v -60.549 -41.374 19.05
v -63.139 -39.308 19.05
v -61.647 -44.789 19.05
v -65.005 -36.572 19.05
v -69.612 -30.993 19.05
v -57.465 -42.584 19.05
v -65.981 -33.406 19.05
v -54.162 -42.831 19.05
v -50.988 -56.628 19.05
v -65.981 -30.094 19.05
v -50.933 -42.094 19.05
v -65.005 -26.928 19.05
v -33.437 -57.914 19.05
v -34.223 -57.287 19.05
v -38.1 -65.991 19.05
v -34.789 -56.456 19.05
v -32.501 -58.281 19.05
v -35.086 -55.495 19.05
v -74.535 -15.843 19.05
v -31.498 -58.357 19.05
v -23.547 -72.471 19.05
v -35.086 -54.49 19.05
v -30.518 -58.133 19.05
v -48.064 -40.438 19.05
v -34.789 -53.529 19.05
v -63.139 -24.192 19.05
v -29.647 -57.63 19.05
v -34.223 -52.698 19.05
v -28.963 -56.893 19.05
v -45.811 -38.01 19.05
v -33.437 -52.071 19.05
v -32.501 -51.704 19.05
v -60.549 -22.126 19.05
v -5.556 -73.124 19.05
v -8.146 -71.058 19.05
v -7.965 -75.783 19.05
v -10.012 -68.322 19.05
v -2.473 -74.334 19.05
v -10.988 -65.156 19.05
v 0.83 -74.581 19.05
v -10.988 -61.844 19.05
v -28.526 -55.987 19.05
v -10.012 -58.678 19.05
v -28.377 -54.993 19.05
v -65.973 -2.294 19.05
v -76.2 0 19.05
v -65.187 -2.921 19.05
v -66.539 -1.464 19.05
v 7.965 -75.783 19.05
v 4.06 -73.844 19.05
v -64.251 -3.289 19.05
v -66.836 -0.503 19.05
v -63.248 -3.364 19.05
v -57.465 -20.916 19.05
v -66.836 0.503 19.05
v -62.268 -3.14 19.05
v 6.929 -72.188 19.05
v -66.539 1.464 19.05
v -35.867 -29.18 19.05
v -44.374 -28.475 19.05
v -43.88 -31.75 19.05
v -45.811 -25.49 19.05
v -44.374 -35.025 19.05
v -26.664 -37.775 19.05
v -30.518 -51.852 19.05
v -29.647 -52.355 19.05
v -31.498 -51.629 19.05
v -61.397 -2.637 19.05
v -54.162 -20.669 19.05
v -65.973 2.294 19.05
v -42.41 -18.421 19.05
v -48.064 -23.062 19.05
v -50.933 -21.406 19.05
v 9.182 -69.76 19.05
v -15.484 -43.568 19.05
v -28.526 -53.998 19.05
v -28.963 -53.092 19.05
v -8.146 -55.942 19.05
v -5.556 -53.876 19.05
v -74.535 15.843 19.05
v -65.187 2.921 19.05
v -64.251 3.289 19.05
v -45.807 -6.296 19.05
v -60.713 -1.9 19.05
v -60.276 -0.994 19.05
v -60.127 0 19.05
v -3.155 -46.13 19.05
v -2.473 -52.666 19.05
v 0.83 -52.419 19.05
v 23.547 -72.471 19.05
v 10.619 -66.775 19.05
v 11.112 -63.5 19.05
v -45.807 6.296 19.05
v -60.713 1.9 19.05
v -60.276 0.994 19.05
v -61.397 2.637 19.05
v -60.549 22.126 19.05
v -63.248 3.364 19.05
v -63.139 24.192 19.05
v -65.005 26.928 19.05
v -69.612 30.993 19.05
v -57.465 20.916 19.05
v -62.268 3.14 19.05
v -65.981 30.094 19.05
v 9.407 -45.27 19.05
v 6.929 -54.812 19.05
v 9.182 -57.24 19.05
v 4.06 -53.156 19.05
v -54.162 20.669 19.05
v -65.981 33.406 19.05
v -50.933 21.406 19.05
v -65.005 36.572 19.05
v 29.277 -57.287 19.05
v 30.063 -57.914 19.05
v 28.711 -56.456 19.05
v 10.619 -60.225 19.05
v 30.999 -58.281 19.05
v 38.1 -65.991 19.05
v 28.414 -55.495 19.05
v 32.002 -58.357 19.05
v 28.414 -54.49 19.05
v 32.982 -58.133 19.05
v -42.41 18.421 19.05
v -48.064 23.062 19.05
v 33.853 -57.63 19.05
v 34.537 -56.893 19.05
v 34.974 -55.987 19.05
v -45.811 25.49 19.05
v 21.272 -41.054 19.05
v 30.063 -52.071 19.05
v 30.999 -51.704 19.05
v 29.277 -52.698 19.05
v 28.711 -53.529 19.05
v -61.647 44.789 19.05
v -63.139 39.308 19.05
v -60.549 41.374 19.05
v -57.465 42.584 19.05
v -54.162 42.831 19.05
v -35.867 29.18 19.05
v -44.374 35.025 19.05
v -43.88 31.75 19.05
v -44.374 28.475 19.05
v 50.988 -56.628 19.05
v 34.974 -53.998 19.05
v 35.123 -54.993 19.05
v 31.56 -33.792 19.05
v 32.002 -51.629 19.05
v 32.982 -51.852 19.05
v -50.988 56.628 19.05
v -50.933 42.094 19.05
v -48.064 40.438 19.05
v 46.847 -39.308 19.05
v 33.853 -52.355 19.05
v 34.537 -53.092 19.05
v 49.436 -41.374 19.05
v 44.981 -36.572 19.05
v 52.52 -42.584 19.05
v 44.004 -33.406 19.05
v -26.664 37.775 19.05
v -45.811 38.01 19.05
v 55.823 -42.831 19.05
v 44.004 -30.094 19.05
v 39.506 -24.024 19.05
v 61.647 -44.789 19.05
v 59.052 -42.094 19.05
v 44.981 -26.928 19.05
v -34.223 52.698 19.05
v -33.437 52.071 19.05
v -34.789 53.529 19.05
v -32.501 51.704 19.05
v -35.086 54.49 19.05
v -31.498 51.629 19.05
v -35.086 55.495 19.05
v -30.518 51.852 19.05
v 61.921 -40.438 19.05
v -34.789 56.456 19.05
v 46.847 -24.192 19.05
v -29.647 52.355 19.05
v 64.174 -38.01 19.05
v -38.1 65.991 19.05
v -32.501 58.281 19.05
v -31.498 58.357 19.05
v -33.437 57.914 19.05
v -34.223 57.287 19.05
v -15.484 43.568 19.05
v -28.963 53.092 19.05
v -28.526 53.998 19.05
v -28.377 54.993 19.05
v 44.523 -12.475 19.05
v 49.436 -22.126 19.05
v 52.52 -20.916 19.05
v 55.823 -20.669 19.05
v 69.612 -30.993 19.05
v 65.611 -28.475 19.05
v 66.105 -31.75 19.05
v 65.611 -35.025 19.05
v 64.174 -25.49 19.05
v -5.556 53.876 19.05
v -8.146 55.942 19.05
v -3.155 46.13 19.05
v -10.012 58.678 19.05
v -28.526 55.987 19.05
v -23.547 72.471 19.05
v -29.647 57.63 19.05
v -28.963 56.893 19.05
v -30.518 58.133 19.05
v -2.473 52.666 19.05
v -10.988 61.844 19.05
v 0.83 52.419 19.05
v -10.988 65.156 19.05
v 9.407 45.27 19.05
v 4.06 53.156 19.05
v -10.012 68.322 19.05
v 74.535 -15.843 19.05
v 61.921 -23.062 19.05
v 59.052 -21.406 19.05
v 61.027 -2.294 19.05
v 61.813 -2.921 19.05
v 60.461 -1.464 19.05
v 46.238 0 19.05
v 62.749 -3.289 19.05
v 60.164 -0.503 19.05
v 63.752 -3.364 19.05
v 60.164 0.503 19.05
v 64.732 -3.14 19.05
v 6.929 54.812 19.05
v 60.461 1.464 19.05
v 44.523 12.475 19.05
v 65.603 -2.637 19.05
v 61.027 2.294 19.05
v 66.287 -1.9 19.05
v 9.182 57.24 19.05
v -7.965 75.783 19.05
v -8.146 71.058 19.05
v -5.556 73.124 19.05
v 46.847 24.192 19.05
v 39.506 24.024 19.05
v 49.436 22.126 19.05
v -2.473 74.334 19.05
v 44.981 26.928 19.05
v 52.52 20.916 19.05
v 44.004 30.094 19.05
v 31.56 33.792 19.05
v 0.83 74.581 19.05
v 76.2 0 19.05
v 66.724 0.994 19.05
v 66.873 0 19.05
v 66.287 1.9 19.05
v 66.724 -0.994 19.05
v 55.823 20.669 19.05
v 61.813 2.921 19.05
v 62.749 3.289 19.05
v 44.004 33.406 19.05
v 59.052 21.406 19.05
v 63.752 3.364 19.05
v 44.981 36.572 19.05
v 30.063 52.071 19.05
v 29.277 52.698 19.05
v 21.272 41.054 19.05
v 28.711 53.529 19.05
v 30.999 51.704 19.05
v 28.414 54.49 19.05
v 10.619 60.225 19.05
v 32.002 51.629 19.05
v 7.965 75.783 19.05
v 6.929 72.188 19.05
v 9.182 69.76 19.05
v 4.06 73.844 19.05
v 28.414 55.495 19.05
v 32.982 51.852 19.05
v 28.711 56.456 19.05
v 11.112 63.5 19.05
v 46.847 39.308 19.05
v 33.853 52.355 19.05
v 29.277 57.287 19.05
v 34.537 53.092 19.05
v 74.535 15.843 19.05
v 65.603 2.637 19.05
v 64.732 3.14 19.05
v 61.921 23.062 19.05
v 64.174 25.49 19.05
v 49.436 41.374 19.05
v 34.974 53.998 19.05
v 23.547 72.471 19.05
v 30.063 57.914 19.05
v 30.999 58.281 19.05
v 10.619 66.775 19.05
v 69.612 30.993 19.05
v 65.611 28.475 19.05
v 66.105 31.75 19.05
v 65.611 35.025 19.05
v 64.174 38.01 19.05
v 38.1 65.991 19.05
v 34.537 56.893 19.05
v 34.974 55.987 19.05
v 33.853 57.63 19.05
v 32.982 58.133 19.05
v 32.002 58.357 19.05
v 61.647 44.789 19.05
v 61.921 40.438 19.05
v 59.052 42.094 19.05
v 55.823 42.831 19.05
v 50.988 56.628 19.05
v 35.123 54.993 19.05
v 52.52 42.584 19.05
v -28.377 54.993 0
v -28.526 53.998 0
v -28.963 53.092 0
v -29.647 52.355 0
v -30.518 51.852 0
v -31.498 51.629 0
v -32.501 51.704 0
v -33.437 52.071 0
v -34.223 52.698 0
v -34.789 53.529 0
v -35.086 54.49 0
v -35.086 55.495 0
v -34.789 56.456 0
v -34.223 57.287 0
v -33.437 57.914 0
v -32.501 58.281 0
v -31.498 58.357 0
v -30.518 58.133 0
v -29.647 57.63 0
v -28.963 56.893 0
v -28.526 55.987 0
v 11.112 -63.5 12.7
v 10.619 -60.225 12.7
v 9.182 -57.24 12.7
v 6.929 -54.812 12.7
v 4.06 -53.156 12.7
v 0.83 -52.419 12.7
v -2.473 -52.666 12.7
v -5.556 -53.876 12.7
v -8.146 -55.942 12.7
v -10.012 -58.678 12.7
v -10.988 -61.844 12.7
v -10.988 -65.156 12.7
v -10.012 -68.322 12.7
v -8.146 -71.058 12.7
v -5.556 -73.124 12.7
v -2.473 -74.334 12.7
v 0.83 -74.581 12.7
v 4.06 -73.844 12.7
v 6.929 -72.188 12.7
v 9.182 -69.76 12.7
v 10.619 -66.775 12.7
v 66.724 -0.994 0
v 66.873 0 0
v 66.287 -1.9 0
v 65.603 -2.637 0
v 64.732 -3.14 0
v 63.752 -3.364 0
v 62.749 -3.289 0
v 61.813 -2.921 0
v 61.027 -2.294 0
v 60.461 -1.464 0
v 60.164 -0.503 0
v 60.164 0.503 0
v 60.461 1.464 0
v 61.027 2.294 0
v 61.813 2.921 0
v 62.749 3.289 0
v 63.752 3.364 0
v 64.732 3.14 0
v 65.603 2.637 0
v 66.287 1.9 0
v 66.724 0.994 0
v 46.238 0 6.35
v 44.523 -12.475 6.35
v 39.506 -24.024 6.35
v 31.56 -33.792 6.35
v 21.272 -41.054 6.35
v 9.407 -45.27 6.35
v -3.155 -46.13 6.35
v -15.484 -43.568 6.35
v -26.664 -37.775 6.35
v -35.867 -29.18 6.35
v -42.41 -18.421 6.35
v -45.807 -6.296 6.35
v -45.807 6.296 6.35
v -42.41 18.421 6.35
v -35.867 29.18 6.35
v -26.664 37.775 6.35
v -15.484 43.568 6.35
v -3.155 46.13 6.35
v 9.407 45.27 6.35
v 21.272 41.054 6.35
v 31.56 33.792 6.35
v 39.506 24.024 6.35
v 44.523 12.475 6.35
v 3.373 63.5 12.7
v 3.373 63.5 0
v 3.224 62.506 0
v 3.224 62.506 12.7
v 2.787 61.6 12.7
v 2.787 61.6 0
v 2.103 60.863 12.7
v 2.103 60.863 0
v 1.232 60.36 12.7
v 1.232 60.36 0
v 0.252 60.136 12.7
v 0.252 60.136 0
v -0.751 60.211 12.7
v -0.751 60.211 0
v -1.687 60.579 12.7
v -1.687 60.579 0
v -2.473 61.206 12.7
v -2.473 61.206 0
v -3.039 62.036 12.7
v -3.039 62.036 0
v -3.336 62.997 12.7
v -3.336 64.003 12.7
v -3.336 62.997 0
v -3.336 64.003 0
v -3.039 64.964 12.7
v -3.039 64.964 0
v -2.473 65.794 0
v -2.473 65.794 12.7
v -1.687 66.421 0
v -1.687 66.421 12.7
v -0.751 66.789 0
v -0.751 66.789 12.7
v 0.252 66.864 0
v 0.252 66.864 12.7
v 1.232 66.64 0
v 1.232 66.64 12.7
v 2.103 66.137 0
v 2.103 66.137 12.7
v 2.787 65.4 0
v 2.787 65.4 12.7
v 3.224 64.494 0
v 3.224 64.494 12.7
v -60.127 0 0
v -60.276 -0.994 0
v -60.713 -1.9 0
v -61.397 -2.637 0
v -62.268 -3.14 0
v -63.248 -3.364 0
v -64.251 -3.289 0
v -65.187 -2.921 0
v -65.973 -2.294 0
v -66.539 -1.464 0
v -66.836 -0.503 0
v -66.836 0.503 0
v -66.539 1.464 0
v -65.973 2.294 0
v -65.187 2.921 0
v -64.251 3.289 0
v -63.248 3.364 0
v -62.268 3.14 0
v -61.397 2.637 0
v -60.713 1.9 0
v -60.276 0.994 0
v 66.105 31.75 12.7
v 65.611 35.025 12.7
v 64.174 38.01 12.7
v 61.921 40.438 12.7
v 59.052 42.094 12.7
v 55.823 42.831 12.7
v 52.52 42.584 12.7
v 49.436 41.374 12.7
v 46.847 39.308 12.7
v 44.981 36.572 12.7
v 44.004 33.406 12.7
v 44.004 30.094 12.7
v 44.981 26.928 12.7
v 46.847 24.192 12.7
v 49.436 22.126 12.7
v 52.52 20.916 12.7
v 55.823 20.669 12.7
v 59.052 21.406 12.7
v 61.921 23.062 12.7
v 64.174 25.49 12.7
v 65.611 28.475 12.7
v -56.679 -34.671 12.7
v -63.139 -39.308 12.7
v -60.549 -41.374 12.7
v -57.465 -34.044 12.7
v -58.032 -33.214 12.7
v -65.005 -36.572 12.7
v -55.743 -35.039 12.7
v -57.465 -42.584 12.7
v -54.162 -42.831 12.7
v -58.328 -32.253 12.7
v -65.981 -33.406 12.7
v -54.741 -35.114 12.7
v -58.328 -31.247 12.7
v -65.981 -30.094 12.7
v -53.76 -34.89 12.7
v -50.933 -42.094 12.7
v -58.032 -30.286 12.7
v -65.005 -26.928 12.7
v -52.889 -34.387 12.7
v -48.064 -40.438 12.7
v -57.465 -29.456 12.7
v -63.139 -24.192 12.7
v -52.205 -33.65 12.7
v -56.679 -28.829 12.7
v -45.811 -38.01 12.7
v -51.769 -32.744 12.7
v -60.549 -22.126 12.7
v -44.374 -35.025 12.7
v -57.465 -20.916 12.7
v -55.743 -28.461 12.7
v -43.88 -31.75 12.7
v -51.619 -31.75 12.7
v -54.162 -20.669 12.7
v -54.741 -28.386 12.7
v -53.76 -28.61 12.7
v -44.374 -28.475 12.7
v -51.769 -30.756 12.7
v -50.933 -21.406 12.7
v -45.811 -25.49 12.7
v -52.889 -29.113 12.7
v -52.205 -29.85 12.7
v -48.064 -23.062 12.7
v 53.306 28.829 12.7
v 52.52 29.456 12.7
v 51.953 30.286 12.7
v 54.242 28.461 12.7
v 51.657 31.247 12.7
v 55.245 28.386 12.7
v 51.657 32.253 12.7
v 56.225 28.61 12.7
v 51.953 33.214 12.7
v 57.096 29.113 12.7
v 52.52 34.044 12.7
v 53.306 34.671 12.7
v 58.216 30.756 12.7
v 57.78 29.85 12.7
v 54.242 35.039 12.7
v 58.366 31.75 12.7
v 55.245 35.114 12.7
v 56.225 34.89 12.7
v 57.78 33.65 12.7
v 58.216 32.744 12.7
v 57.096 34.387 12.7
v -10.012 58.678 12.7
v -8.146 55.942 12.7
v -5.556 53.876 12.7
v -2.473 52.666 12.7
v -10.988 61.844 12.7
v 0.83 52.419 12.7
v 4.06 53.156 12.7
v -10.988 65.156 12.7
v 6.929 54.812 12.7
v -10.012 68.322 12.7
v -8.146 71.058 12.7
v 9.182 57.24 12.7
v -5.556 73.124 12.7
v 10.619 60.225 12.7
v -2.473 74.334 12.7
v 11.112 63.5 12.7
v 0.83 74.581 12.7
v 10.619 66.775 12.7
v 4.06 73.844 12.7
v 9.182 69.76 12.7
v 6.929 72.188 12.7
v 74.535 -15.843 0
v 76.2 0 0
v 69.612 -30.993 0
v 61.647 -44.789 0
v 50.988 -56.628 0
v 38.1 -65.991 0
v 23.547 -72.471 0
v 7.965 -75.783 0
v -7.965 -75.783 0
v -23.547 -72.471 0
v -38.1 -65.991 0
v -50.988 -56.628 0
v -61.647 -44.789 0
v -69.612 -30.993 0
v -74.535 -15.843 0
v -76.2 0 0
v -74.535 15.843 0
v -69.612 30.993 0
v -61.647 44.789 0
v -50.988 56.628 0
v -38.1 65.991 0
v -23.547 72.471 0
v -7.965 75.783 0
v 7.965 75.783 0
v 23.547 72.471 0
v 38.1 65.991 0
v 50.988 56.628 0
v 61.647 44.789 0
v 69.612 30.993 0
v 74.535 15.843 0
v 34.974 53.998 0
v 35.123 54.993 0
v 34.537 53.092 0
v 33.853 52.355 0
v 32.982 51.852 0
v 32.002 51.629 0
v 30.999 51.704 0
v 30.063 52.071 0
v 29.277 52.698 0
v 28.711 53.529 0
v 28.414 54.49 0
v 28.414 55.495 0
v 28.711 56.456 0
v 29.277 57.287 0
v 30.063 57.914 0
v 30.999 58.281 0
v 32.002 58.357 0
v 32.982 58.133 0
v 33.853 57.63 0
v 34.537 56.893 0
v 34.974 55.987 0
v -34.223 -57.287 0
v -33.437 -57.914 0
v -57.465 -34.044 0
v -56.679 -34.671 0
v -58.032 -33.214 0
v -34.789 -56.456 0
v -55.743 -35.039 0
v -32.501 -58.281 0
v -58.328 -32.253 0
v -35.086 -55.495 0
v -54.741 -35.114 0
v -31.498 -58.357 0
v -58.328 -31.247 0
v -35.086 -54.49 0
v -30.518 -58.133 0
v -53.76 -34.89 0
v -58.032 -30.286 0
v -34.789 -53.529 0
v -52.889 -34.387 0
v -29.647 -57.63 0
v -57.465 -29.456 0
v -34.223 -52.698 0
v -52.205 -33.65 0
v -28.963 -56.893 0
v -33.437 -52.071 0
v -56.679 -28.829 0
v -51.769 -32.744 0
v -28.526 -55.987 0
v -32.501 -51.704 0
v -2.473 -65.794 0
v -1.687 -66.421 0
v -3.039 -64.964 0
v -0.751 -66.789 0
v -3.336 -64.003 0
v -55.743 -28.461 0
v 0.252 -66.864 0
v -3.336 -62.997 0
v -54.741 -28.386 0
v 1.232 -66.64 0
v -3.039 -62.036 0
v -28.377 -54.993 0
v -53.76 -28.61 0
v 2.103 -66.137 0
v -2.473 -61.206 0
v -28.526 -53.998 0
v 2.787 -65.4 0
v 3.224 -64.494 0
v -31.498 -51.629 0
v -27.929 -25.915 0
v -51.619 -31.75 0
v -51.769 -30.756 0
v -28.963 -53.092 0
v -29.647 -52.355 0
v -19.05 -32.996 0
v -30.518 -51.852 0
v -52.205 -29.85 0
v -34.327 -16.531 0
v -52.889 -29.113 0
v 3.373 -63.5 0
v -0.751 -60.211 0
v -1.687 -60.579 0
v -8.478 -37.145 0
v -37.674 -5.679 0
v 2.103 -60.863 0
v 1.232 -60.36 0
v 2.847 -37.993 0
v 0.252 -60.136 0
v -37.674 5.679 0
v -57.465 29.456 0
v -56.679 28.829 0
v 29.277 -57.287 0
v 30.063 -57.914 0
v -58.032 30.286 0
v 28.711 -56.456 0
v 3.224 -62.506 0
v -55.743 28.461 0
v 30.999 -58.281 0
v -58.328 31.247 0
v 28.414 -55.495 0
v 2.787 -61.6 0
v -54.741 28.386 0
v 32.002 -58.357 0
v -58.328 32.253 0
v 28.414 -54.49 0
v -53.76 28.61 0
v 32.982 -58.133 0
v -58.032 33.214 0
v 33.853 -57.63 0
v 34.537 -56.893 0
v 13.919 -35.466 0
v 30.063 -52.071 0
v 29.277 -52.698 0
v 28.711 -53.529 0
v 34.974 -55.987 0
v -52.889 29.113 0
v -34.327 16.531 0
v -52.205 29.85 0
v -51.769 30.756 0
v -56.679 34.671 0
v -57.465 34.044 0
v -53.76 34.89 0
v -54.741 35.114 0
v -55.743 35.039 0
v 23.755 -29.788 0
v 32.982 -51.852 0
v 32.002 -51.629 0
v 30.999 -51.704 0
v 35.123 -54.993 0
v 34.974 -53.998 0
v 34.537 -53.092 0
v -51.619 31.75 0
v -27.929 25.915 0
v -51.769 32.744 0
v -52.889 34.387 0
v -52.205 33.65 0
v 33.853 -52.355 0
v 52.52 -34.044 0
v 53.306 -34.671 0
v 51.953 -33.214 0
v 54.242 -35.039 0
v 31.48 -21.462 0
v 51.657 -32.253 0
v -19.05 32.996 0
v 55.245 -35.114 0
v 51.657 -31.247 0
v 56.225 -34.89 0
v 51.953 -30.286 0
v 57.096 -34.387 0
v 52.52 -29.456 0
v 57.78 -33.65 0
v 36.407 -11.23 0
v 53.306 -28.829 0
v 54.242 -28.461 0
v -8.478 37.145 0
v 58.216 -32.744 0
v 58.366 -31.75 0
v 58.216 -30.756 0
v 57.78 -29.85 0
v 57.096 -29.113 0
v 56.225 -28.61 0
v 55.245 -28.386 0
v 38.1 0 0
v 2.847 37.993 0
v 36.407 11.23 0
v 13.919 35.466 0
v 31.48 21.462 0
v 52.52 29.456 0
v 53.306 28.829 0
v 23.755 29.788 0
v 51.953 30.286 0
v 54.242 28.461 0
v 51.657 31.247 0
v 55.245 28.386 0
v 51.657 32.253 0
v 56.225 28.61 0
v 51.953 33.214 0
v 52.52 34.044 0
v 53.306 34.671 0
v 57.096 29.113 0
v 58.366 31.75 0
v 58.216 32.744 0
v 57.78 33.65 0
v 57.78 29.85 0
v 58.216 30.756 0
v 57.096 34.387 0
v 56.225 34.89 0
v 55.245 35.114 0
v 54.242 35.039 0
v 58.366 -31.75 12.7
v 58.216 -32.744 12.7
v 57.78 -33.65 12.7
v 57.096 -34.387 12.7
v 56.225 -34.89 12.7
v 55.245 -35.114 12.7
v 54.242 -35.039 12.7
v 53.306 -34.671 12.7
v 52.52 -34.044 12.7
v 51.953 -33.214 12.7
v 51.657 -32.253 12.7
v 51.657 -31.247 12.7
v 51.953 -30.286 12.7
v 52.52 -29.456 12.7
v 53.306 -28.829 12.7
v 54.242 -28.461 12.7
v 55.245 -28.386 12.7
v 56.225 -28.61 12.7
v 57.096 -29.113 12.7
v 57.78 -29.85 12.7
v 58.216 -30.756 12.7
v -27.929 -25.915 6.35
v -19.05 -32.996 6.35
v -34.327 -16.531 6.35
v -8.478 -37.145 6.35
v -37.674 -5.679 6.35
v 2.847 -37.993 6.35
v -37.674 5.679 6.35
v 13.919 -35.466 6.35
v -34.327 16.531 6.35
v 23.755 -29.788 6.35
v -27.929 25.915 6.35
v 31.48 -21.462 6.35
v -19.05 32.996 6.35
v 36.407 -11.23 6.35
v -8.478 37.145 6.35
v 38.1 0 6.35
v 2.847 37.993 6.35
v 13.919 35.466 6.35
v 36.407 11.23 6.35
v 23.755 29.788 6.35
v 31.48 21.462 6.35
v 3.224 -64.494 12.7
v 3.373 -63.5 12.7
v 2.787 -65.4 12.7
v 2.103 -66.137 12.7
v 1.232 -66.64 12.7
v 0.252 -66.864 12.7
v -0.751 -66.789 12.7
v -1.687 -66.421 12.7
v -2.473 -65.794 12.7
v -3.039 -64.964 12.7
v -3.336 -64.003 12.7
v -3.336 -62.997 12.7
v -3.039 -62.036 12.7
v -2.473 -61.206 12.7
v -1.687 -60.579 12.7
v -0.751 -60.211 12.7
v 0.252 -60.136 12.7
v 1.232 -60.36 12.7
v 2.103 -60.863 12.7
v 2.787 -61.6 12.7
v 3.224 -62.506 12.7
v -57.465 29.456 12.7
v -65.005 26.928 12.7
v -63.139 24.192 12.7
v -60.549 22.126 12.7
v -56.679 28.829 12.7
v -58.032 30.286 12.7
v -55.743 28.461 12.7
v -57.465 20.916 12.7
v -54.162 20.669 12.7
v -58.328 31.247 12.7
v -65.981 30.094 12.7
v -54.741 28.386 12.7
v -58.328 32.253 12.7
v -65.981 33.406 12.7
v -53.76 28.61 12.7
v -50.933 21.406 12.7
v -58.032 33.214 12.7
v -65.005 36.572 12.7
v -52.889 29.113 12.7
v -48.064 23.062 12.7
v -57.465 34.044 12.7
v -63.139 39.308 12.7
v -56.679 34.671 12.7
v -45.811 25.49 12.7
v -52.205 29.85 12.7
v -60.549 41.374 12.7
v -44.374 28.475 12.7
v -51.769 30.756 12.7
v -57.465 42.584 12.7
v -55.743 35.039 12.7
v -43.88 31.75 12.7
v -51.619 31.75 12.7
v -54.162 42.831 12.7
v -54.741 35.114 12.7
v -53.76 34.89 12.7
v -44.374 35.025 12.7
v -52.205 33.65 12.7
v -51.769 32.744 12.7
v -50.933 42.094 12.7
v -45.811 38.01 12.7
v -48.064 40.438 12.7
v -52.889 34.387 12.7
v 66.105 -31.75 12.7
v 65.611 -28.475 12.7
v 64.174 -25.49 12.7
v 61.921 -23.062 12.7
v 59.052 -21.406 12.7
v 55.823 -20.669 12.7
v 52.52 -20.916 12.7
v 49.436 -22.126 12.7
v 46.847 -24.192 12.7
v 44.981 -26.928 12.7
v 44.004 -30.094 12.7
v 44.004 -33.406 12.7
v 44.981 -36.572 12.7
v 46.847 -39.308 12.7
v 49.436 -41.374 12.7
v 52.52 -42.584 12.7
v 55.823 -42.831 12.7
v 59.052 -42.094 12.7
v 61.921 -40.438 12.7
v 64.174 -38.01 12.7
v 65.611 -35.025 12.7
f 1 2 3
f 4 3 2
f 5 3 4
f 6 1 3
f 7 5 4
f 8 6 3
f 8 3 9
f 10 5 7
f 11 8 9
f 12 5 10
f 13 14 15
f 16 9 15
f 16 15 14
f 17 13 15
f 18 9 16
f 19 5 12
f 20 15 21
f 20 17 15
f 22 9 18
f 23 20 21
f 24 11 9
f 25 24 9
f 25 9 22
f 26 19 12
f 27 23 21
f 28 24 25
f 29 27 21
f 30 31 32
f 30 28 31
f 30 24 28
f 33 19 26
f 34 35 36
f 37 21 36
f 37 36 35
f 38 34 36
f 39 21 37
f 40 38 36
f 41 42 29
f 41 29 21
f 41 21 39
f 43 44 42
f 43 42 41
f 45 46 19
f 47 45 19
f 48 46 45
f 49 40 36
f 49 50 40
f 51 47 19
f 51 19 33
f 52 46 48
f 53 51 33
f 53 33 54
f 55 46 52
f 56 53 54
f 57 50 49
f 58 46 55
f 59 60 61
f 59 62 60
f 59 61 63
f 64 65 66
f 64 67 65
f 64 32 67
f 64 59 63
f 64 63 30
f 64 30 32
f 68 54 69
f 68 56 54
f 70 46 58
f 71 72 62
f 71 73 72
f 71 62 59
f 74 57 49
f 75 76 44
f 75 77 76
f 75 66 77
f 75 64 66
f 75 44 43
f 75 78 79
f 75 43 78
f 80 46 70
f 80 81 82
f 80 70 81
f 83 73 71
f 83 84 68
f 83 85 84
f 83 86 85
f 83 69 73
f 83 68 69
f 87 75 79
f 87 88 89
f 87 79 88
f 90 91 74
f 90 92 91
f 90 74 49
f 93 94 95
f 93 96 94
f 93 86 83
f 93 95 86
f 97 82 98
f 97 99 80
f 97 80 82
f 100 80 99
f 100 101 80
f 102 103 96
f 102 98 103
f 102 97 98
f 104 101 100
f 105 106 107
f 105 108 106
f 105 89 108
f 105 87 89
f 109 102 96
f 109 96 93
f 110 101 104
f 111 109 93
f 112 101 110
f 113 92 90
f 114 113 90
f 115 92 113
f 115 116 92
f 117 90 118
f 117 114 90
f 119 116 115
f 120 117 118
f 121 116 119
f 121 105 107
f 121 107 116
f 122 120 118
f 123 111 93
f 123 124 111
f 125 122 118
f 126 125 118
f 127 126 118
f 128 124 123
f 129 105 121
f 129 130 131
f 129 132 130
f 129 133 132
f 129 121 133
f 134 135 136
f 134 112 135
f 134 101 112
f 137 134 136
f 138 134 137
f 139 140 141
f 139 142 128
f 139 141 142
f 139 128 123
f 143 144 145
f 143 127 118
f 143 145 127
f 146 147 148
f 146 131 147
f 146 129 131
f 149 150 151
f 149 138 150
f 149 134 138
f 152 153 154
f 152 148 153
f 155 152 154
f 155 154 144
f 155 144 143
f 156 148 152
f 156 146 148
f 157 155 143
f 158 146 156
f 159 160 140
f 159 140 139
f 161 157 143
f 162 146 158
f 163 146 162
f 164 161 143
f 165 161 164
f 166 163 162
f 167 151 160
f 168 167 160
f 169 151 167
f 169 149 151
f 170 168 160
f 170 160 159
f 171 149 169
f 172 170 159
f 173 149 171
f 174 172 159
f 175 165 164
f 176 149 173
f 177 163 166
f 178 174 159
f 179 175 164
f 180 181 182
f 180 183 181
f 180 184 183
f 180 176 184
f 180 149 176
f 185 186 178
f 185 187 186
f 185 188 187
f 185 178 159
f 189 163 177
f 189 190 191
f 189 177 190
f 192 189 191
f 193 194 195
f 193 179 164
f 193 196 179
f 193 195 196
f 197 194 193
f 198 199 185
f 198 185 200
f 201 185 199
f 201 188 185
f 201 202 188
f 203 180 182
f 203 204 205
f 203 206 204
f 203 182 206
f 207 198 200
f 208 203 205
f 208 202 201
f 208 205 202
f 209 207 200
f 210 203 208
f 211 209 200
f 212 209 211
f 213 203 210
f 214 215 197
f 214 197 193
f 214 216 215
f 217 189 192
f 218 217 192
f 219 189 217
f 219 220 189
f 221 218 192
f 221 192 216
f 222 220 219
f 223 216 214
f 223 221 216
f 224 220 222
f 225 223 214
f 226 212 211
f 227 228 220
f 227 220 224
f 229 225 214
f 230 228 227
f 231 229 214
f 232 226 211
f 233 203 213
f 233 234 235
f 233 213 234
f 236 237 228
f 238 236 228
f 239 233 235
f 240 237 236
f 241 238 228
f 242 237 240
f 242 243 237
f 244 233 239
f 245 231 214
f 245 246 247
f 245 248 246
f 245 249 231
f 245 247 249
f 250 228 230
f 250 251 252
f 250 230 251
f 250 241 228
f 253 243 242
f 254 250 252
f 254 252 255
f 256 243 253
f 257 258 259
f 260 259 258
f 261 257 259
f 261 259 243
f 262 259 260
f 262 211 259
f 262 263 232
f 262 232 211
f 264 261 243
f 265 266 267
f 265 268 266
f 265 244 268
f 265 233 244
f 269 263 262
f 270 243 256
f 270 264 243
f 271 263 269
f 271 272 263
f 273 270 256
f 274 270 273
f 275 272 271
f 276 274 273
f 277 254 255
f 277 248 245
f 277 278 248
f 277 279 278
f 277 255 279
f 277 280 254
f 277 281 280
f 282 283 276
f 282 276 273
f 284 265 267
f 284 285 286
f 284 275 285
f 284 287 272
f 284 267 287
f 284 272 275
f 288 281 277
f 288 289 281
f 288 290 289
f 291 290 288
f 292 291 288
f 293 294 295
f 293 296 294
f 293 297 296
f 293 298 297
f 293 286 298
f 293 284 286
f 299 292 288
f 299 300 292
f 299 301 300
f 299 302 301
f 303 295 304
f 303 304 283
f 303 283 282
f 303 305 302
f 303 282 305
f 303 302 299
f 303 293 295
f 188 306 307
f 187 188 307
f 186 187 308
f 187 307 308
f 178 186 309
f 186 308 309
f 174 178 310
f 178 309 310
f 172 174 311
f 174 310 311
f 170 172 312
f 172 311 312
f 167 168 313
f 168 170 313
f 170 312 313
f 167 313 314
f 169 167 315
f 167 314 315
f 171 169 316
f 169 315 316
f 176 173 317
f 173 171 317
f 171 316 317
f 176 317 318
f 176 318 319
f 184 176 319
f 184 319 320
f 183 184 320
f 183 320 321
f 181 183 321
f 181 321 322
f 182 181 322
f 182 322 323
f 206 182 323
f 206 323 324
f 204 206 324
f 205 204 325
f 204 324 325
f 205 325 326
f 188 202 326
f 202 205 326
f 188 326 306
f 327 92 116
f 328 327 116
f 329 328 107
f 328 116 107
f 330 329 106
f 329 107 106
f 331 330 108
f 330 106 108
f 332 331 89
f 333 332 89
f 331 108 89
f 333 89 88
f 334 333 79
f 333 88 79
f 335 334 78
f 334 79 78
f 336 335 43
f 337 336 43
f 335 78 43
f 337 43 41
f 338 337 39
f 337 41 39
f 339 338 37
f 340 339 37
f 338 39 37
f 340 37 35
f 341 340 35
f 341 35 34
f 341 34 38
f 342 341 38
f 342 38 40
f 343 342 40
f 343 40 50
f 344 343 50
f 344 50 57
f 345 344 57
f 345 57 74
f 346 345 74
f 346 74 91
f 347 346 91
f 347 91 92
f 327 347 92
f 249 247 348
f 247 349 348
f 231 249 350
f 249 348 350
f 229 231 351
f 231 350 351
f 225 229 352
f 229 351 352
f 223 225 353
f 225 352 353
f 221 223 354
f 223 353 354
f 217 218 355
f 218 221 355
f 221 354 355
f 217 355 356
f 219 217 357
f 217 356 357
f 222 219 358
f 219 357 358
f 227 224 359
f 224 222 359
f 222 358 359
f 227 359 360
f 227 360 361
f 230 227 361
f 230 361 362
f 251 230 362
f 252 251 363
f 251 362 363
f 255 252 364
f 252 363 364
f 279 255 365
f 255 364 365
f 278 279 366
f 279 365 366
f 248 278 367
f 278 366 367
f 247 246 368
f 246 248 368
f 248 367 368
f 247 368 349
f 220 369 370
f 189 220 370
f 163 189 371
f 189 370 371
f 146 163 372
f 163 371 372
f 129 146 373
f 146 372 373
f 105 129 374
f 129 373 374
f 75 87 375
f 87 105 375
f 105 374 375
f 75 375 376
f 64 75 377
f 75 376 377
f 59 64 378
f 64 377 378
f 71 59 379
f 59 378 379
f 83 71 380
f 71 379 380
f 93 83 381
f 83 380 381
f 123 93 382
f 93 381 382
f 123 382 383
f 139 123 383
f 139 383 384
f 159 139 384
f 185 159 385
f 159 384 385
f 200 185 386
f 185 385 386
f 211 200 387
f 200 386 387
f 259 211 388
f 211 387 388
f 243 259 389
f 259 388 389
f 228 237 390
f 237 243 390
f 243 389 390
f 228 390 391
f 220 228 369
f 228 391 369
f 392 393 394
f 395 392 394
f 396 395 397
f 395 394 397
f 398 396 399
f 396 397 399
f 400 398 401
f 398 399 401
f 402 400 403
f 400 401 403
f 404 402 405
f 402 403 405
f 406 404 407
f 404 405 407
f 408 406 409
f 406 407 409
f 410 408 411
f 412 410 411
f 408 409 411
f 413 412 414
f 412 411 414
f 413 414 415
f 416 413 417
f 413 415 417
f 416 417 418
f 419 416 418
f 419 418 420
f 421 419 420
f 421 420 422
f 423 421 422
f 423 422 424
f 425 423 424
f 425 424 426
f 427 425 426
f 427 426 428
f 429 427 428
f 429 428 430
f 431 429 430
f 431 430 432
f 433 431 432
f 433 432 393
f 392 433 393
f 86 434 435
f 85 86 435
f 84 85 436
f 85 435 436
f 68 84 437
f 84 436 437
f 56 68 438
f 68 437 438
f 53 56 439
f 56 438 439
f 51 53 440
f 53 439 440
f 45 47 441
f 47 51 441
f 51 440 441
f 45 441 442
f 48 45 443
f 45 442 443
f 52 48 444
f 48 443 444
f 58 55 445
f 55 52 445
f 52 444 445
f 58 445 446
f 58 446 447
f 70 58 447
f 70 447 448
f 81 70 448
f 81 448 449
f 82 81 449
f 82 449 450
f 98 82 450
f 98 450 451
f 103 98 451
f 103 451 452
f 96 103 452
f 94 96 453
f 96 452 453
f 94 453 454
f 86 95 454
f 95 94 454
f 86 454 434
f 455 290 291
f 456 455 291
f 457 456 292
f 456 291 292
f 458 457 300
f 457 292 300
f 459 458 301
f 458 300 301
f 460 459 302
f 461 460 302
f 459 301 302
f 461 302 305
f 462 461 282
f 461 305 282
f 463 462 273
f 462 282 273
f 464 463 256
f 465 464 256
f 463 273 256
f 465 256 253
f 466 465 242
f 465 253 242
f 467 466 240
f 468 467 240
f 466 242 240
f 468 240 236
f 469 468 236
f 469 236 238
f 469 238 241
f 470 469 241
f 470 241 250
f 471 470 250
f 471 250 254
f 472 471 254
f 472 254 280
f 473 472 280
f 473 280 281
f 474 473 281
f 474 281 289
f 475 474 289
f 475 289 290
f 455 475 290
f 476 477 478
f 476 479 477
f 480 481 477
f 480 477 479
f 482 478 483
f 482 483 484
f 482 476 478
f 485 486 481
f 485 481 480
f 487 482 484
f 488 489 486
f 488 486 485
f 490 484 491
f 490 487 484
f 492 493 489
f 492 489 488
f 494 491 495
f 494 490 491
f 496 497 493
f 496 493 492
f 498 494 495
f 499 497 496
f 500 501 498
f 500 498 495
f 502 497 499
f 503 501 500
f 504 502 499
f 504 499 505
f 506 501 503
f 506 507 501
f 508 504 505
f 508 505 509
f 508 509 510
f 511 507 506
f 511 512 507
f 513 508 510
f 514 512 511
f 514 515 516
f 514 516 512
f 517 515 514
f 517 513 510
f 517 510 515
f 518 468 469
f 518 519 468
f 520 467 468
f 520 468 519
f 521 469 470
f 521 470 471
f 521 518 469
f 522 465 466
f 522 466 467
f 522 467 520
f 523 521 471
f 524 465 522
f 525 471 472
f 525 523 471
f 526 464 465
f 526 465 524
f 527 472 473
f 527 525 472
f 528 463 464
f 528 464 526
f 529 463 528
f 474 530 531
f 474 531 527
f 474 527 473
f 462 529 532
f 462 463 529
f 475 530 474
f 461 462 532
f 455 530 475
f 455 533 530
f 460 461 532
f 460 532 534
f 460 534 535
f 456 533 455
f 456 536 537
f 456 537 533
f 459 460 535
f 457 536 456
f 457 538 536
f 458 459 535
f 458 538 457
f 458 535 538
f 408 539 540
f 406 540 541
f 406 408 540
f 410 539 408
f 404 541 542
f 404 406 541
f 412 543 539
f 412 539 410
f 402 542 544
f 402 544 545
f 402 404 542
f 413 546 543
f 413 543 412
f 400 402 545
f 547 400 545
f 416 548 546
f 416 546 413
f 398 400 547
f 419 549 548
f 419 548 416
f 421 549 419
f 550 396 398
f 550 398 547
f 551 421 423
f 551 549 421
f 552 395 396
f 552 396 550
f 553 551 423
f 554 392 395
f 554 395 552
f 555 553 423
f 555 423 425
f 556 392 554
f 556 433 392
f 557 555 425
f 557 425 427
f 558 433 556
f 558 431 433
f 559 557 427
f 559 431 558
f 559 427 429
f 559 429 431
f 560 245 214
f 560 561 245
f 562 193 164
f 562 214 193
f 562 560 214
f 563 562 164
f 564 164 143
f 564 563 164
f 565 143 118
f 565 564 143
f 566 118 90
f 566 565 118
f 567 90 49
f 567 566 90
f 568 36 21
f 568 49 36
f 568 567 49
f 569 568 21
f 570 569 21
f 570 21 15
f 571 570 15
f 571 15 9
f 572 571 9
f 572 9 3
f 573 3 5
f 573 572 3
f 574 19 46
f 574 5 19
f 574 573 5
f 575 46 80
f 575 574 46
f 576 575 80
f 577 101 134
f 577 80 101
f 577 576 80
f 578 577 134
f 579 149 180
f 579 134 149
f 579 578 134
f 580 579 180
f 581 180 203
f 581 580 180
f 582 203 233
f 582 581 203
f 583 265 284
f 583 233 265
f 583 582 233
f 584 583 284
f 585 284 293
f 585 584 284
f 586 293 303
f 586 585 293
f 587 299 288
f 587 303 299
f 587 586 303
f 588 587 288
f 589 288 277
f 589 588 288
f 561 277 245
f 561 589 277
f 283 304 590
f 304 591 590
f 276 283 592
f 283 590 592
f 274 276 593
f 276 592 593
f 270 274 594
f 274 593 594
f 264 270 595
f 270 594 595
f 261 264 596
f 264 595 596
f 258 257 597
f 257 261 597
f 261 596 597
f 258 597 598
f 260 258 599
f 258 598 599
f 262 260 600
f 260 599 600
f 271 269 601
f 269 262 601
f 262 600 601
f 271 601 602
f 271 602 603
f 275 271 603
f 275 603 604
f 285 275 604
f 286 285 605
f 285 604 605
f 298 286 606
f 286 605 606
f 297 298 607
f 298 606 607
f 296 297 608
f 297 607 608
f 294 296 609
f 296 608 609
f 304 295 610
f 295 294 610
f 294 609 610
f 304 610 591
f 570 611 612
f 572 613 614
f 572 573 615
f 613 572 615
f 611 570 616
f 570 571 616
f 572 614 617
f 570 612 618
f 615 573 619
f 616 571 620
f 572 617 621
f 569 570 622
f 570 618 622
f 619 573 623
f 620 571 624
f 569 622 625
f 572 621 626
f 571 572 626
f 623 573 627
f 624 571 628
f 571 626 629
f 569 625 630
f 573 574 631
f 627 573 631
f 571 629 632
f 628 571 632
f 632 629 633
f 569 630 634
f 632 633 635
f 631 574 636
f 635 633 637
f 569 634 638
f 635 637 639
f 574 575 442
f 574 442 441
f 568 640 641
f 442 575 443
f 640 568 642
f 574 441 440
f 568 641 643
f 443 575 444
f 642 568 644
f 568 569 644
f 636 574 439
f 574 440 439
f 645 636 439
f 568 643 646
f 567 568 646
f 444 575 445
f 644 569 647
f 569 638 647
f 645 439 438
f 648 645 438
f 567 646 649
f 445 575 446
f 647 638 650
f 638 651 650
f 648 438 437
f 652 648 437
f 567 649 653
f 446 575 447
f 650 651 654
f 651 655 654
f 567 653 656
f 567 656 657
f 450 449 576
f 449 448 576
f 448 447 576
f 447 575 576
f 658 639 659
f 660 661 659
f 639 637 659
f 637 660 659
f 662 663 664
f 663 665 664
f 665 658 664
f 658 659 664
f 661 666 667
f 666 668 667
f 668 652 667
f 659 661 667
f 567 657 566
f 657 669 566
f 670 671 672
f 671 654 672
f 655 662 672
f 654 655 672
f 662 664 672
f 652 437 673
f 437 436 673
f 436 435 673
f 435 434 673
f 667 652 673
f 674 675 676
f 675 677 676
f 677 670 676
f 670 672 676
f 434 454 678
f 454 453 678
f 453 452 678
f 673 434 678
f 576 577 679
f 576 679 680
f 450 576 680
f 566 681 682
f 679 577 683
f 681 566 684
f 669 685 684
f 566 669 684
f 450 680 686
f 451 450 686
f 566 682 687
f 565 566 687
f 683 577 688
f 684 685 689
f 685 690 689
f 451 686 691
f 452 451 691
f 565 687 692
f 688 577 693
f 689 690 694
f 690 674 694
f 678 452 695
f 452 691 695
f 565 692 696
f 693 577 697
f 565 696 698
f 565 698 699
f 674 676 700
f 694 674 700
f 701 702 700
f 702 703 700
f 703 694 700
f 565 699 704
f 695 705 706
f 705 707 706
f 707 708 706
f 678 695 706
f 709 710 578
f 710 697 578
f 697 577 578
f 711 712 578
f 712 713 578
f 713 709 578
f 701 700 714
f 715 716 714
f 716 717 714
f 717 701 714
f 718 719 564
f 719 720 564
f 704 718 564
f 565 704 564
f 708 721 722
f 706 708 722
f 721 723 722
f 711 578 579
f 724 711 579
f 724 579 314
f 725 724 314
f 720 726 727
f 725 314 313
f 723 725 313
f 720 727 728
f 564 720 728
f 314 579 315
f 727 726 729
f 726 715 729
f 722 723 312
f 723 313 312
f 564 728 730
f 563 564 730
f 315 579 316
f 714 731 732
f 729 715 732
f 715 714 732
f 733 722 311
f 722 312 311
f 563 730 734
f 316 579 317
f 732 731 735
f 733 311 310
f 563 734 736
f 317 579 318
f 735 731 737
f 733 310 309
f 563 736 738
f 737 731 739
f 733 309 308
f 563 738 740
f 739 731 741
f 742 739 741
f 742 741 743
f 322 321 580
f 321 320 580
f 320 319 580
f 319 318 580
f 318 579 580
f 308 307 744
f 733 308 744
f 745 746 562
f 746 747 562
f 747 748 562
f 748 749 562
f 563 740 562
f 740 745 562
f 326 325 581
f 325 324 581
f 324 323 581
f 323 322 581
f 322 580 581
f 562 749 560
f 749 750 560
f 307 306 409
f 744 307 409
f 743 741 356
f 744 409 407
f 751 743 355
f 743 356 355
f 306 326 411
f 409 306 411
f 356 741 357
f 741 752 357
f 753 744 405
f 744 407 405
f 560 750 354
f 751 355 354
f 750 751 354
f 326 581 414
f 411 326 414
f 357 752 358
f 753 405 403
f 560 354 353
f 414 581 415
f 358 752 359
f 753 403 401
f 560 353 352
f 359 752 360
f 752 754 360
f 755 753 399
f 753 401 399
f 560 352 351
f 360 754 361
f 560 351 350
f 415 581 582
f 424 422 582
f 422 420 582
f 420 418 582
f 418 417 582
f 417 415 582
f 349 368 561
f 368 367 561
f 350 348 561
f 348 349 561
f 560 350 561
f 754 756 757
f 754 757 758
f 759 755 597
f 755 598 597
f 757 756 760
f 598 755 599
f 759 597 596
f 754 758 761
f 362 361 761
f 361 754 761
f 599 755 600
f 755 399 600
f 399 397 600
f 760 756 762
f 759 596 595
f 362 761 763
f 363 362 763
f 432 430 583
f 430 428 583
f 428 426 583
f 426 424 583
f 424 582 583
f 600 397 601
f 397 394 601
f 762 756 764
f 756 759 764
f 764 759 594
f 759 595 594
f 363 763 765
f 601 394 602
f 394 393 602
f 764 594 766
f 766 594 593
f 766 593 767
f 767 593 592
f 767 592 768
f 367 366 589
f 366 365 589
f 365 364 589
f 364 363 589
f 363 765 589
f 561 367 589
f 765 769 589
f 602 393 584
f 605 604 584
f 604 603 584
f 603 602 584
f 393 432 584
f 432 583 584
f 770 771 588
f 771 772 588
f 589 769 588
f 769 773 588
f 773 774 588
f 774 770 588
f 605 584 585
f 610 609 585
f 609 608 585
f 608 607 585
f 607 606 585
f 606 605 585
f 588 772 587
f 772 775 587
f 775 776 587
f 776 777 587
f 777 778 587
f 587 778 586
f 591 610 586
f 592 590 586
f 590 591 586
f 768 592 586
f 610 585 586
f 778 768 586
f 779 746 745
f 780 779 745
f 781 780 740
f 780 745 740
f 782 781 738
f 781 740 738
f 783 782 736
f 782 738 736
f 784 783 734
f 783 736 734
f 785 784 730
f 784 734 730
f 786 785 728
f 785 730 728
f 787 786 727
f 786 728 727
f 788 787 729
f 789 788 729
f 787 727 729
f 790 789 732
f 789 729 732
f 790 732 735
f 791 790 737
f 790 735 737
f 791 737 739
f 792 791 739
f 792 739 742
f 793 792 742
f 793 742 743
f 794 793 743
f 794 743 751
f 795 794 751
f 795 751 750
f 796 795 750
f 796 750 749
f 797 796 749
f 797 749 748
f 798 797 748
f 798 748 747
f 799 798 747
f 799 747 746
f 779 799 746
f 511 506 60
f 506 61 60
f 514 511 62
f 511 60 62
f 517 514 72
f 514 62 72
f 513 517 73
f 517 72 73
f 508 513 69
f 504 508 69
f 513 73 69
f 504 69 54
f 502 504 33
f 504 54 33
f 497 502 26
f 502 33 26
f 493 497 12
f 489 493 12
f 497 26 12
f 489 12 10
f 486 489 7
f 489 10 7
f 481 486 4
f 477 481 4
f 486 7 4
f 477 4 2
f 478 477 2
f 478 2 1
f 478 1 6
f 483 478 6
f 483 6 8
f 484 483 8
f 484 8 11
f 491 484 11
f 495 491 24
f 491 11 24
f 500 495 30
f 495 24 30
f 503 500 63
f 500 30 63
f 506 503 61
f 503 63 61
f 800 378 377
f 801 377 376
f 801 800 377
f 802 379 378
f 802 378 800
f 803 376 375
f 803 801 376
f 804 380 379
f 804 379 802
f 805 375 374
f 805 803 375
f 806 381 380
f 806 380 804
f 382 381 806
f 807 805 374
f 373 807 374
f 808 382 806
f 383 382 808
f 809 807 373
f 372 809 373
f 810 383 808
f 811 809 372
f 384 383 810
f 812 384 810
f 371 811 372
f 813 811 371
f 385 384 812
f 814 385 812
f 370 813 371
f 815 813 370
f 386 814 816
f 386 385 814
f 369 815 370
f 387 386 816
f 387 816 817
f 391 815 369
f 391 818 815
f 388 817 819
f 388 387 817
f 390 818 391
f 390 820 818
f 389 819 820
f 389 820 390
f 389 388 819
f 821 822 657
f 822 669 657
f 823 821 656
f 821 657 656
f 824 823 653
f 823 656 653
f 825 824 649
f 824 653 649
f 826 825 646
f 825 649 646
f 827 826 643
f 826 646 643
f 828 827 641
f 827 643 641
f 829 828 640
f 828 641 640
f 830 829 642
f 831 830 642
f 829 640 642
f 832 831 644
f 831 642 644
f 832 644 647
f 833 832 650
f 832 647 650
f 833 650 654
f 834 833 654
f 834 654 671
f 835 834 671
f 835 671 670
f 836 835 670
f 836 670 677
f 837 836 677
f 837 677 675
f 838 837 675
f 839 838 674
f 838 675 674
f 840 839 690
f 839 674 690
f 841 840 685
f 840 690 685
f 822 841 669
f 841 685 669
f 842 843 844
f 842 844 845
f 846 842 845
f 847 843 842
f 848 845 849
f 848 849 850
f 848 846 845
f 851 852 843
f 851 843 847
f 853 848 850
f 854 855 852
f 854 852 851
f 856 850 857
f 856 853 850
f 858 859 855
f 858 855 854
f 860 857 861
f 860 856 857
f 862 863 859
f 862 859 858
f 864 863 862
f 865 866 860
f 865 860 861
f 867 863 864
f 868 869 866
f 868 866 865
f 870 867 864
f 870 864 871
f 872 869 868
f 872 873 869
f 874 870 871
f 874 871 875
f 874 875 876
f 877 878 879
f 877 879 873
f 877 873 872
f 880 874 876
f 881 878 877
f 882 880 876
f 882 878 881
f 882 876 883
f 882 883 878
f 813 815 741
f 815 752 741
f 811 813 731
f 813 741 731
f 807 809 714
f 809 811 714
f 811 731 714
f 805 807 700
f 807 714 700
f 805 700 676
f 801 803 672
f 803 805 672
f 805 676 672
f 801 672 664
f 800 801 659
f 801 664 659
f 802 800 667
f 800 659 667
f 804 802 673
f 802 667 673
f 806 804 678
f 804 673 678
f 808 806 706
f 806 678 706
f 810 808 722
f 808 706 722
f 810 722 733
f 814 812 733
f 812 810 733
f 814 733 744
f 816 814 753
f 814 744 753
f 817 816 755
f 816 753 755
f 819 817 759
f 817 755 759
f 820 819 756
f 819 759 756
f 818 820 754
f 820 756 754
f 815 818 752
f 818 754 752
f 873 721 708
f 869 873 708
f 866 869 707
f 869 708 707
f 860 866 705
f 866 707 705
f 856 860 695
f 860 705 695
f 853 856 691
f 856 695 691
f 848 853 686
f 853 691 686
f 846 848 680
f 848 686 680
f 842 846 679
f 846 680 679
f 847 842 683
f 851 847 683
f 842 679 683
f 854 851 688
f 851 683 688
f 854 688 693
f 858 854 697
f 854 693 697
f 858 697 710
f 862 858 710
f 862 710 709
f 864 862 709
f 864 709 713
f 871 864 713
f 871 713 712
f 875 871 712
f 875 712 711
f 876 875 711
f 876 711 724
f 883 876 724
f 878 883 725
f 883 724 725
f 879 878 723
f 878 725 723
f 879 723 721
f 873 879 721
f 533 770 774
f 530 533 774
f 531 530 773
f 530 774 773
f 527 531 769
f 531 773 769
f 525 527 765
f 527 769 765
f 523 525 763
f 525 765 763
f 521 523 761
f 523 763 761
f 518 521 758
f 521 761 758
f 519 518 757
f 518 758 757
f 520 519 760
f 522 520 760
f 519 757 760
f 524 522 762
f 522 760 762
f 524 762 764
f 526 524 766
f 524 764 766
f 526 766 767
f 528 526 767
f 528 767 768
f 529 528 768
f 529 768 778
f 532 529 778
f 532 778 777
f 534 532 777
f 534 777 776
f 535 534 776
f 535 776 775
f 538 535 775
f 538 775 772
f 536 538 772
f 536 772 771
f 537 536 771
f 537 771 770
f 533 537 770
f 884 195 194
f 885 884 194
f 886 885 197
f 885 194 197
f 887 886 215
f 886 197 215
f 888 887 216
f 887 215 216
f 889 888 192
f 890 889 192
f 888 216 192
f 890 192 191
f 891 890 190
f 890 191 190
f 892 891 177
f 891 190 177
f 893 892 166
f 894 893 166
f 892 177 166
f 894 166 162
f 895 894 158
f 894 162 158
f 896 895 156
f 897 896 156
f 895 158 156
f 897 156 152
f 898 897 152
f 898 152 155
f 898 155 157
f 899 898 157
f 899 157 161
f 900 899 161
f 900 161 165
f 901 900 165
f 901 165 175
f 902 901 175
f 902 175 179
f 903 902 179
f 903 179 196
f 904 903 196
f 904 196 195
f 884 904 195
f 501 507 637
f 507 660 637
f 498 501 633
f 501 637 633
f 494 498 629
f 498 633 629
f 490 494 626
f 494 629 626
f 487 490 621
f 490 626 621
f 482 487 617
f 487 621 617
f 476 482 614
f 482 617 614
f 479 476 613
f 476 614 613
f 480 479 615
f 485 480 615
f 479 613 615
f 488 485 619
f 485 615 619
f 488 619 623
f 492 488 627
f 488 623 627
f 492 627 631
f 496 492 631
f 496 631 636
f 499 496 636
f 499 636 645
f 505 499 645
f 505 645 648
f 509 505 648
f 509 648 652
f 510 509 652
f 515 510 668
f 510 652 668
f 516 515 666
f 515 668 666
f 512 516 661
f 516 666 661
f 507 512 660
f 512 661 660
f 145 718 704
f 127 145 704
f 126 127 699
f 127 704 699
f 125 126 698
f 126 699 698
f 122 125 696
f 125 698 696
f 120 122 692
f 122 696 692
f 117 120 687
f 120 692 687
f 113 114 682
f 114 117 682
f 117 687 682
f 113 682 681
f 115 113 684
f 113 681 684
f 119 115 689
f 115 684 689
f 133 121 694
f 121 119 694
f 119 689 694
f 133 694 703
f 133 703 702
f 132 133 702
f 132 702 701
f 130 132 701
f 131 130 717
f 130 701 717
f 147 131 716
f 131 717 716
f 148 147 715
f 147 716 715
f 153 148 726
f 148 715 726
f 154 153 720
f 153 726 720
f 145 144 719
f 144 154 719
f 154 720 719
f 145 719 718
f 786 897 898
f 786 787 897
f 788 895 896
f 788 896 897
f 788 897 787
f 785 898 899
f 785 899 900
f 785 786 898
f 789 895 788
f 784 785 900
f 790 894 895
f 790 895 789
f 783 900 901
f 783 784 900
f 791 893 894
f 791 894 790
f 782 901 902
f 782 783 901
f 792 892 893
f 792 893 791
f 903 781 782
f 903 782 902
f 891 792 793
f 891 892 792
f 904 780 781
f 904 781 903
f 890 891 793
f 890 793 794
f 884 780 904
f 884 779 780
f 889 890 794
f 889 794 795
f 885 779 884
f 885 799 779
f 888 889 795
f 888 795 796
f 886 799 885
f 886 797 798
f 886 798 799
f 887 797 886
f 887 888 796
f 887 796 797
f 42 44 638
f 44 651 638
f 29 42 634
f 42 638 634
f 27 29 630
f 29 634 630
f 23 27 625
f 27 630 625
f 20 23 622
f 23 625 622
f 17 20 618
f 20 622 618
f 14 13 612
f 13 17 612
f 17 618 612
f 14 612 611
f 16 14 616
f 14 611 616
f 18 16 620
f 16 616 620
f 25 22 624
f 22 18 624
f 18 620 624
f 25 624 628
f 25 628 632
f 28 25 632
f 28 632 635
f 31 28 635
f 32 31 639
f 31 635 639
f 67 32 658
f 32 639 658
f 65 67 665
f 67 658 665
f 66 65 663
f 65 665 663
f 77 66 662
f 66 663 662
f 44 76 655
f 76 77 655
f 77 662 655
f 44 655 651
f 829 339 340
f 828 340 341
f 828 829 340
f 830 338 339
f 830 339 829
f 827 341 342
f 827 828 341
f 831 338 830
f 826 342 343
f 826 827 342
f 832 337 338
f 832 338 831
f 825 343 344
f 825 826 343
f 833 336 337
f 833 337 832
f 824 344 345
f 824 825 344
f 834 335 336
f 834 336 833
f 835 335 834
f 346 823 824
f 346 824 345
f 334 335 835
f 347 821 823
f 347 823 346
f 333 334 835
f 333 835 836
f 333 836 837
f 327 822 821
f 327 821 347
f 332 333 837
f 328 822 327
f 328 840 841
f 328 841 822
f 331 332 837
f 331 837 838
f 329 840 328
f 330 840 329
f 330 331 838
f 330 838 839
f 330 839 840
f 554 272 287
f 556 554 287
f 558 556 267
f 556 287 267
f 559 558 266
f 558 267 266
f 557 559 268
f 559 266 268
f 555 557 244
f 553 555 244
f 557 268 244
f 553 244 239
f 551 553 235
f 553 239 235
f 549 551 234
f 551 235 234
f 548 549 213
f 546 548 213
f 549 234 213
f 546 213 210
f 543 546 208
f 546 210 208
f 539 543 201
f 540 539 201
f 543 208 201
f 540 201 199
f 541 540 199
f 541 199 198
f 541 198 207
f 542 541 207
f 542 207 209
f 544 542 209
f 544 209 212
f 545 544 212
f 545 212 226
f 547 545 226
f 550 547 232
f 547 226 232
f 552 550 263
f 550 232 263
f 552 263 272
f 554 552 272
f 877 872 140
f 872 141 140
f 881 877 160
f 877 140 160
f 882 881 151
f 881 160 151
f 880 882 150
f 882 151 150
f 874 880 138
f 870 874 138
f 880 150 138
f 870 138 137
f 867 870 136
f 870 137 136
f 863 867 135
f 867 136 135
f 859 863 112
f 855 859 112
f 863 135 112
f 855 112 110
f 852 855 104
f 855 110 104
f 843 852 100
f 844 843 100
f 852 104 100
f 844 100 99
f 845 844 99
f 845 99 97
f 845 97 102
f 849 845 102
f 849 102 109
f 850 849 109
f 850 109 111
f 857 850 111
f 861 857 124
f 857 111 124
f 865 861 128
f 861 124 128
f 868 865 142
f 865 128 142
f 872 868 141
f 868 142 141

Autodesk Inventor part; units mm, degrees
ref_plane "YZ Plane" through (0, 0, 0) normal (1, 0, 0) x (0, 1, 0)
ref_plane "XZ Plane" through (0, 0, 0) normal (0, 1, 0) x (-1, 0, 0)
ref_plane "XY Plane" through (0, 0, 0) normal (0, 0, 1) x (1, 0, 0)
sketch "Sketch1" plane through (0, 0, 0) normal (0, 0, 1) x (1, 0, 0)
  circle A0 centre (0, 0) radius 76.2
  circle A1 centre (0, 63.5) radius 3.3734
  circle A2 centre (0, 0) radius 38.1
  circle A3 centre (-31.75, 54.9926) radius 3.3734
  circle A4 centre (-54.9926, 31.75) radius 3.3734
  circle A5 centre (-63.5, 0) radius 3.3734
  circle A6 centre (-54.9926, -31.75) radius 3.3734
  circle A7 centre (-31.75, -54.9926) radius 3.3734
  circle A8 centre (0, -63.5) radius 3.3734
  circle A9 centre (31.75, -54.9926) radius 3.3734
  circle A10 centre (54.9926, -31.75) radius 3.3734
  circle A11 centre (63.5, 0) radius 3.3734
  circle A12 centre (54.9926, 31.75) radius 3.3734
  circle A13 centre (31.75, 54.9926) radius 3.3734
  dimension "d0" = 63.5
  dimension "d1" = 152.4
  dimension "d2" = 6.7469
  dimension "d3" = 76.2
  dimension "d6" = 360
extrude "Extrusion1" add sketch "Sketch1" along normal blind 6.35
sketch "Sketch2" plane through (0, 0, 6.35) normal (0, 0, 1) x (1, 0, 0)
  circle A0 centre (0, 0) radius 46.2375
  circle A1 centre (0, 0) radius 52.5875
  dimension "d10" = 92.475
  dimension "d11" = 6.35
extrude "Extrusion2" add sketch "Sketch2" along normal blind 12.7
sketch "Sketch3" plane through (0, 0, 6.35) normal (0, 0, 1) x (1, 0, 0)
  circle A0 centre (0, 63.5) radius 3.3734 projected
  circle A1 centre (-54.9926, 31.75) radius 3.3734 projected
  circle A2 centre (54.9926, -31.75) radius 3.3734 projected
  circle A3 centre (0, -63.5) radius 3.3734 projected
  circle A4 centre (-63.5, 0) radius 3.3734 projected
  circle A5 centre (31.75, 54.9926) radius 3.3734 projected
  circle A6 centre (-31.75, 54.9926) radius 3.3734 projected
  circle A7 centre (54.9926, 31.75) radius 3.3734 projected
  circle A8 centre (-31.75, -54.9926) radius 3.3734 projected
  circle A9 centre (-54.9926, -31.75) radius 3.3734 projected
  circle A10 centre (31.75, -54.9926) radius 3.3734 projected
  circle A11 centre (63.5, 0) radius 3.3734 projected
  circle A12 centre (0, 0) radius 76.2 projected
  circle A13 centre (0, 0) radius 52.5875 projected
extrude "Extrusion3" add sketch "Sketch3" along normal blind 12.7
sketch "Sketch4" plane through (0, 0, 19.05) normal (0, 0, 1) x (1, 0, 0)
  circle A0 centre (0, 63.5) radius 3.3734 construction
  circle A1 centre (0, 63.5) radius 11.1125
  circle A2 centre (-54.9926, 31.75) radius 11.1125
  circle A3 centre (-54.9926, -31.75) radius 11.1125
  circle A4 centre (0, -63.5) radius 11.1125
  circle A5 centre (54.9926, -31.75) radius 11.1125
  circle A6 centre (54.9926, 31.75) radius 11.1125
  point P0 (0, 0)
  dimension "d16" = 22.225
  dimension "d19" = 360
extrude "Extrusion4" cut sketch "Sketch4" against normal blind 6.35
properties part number "28521_Bearing_Holder"
